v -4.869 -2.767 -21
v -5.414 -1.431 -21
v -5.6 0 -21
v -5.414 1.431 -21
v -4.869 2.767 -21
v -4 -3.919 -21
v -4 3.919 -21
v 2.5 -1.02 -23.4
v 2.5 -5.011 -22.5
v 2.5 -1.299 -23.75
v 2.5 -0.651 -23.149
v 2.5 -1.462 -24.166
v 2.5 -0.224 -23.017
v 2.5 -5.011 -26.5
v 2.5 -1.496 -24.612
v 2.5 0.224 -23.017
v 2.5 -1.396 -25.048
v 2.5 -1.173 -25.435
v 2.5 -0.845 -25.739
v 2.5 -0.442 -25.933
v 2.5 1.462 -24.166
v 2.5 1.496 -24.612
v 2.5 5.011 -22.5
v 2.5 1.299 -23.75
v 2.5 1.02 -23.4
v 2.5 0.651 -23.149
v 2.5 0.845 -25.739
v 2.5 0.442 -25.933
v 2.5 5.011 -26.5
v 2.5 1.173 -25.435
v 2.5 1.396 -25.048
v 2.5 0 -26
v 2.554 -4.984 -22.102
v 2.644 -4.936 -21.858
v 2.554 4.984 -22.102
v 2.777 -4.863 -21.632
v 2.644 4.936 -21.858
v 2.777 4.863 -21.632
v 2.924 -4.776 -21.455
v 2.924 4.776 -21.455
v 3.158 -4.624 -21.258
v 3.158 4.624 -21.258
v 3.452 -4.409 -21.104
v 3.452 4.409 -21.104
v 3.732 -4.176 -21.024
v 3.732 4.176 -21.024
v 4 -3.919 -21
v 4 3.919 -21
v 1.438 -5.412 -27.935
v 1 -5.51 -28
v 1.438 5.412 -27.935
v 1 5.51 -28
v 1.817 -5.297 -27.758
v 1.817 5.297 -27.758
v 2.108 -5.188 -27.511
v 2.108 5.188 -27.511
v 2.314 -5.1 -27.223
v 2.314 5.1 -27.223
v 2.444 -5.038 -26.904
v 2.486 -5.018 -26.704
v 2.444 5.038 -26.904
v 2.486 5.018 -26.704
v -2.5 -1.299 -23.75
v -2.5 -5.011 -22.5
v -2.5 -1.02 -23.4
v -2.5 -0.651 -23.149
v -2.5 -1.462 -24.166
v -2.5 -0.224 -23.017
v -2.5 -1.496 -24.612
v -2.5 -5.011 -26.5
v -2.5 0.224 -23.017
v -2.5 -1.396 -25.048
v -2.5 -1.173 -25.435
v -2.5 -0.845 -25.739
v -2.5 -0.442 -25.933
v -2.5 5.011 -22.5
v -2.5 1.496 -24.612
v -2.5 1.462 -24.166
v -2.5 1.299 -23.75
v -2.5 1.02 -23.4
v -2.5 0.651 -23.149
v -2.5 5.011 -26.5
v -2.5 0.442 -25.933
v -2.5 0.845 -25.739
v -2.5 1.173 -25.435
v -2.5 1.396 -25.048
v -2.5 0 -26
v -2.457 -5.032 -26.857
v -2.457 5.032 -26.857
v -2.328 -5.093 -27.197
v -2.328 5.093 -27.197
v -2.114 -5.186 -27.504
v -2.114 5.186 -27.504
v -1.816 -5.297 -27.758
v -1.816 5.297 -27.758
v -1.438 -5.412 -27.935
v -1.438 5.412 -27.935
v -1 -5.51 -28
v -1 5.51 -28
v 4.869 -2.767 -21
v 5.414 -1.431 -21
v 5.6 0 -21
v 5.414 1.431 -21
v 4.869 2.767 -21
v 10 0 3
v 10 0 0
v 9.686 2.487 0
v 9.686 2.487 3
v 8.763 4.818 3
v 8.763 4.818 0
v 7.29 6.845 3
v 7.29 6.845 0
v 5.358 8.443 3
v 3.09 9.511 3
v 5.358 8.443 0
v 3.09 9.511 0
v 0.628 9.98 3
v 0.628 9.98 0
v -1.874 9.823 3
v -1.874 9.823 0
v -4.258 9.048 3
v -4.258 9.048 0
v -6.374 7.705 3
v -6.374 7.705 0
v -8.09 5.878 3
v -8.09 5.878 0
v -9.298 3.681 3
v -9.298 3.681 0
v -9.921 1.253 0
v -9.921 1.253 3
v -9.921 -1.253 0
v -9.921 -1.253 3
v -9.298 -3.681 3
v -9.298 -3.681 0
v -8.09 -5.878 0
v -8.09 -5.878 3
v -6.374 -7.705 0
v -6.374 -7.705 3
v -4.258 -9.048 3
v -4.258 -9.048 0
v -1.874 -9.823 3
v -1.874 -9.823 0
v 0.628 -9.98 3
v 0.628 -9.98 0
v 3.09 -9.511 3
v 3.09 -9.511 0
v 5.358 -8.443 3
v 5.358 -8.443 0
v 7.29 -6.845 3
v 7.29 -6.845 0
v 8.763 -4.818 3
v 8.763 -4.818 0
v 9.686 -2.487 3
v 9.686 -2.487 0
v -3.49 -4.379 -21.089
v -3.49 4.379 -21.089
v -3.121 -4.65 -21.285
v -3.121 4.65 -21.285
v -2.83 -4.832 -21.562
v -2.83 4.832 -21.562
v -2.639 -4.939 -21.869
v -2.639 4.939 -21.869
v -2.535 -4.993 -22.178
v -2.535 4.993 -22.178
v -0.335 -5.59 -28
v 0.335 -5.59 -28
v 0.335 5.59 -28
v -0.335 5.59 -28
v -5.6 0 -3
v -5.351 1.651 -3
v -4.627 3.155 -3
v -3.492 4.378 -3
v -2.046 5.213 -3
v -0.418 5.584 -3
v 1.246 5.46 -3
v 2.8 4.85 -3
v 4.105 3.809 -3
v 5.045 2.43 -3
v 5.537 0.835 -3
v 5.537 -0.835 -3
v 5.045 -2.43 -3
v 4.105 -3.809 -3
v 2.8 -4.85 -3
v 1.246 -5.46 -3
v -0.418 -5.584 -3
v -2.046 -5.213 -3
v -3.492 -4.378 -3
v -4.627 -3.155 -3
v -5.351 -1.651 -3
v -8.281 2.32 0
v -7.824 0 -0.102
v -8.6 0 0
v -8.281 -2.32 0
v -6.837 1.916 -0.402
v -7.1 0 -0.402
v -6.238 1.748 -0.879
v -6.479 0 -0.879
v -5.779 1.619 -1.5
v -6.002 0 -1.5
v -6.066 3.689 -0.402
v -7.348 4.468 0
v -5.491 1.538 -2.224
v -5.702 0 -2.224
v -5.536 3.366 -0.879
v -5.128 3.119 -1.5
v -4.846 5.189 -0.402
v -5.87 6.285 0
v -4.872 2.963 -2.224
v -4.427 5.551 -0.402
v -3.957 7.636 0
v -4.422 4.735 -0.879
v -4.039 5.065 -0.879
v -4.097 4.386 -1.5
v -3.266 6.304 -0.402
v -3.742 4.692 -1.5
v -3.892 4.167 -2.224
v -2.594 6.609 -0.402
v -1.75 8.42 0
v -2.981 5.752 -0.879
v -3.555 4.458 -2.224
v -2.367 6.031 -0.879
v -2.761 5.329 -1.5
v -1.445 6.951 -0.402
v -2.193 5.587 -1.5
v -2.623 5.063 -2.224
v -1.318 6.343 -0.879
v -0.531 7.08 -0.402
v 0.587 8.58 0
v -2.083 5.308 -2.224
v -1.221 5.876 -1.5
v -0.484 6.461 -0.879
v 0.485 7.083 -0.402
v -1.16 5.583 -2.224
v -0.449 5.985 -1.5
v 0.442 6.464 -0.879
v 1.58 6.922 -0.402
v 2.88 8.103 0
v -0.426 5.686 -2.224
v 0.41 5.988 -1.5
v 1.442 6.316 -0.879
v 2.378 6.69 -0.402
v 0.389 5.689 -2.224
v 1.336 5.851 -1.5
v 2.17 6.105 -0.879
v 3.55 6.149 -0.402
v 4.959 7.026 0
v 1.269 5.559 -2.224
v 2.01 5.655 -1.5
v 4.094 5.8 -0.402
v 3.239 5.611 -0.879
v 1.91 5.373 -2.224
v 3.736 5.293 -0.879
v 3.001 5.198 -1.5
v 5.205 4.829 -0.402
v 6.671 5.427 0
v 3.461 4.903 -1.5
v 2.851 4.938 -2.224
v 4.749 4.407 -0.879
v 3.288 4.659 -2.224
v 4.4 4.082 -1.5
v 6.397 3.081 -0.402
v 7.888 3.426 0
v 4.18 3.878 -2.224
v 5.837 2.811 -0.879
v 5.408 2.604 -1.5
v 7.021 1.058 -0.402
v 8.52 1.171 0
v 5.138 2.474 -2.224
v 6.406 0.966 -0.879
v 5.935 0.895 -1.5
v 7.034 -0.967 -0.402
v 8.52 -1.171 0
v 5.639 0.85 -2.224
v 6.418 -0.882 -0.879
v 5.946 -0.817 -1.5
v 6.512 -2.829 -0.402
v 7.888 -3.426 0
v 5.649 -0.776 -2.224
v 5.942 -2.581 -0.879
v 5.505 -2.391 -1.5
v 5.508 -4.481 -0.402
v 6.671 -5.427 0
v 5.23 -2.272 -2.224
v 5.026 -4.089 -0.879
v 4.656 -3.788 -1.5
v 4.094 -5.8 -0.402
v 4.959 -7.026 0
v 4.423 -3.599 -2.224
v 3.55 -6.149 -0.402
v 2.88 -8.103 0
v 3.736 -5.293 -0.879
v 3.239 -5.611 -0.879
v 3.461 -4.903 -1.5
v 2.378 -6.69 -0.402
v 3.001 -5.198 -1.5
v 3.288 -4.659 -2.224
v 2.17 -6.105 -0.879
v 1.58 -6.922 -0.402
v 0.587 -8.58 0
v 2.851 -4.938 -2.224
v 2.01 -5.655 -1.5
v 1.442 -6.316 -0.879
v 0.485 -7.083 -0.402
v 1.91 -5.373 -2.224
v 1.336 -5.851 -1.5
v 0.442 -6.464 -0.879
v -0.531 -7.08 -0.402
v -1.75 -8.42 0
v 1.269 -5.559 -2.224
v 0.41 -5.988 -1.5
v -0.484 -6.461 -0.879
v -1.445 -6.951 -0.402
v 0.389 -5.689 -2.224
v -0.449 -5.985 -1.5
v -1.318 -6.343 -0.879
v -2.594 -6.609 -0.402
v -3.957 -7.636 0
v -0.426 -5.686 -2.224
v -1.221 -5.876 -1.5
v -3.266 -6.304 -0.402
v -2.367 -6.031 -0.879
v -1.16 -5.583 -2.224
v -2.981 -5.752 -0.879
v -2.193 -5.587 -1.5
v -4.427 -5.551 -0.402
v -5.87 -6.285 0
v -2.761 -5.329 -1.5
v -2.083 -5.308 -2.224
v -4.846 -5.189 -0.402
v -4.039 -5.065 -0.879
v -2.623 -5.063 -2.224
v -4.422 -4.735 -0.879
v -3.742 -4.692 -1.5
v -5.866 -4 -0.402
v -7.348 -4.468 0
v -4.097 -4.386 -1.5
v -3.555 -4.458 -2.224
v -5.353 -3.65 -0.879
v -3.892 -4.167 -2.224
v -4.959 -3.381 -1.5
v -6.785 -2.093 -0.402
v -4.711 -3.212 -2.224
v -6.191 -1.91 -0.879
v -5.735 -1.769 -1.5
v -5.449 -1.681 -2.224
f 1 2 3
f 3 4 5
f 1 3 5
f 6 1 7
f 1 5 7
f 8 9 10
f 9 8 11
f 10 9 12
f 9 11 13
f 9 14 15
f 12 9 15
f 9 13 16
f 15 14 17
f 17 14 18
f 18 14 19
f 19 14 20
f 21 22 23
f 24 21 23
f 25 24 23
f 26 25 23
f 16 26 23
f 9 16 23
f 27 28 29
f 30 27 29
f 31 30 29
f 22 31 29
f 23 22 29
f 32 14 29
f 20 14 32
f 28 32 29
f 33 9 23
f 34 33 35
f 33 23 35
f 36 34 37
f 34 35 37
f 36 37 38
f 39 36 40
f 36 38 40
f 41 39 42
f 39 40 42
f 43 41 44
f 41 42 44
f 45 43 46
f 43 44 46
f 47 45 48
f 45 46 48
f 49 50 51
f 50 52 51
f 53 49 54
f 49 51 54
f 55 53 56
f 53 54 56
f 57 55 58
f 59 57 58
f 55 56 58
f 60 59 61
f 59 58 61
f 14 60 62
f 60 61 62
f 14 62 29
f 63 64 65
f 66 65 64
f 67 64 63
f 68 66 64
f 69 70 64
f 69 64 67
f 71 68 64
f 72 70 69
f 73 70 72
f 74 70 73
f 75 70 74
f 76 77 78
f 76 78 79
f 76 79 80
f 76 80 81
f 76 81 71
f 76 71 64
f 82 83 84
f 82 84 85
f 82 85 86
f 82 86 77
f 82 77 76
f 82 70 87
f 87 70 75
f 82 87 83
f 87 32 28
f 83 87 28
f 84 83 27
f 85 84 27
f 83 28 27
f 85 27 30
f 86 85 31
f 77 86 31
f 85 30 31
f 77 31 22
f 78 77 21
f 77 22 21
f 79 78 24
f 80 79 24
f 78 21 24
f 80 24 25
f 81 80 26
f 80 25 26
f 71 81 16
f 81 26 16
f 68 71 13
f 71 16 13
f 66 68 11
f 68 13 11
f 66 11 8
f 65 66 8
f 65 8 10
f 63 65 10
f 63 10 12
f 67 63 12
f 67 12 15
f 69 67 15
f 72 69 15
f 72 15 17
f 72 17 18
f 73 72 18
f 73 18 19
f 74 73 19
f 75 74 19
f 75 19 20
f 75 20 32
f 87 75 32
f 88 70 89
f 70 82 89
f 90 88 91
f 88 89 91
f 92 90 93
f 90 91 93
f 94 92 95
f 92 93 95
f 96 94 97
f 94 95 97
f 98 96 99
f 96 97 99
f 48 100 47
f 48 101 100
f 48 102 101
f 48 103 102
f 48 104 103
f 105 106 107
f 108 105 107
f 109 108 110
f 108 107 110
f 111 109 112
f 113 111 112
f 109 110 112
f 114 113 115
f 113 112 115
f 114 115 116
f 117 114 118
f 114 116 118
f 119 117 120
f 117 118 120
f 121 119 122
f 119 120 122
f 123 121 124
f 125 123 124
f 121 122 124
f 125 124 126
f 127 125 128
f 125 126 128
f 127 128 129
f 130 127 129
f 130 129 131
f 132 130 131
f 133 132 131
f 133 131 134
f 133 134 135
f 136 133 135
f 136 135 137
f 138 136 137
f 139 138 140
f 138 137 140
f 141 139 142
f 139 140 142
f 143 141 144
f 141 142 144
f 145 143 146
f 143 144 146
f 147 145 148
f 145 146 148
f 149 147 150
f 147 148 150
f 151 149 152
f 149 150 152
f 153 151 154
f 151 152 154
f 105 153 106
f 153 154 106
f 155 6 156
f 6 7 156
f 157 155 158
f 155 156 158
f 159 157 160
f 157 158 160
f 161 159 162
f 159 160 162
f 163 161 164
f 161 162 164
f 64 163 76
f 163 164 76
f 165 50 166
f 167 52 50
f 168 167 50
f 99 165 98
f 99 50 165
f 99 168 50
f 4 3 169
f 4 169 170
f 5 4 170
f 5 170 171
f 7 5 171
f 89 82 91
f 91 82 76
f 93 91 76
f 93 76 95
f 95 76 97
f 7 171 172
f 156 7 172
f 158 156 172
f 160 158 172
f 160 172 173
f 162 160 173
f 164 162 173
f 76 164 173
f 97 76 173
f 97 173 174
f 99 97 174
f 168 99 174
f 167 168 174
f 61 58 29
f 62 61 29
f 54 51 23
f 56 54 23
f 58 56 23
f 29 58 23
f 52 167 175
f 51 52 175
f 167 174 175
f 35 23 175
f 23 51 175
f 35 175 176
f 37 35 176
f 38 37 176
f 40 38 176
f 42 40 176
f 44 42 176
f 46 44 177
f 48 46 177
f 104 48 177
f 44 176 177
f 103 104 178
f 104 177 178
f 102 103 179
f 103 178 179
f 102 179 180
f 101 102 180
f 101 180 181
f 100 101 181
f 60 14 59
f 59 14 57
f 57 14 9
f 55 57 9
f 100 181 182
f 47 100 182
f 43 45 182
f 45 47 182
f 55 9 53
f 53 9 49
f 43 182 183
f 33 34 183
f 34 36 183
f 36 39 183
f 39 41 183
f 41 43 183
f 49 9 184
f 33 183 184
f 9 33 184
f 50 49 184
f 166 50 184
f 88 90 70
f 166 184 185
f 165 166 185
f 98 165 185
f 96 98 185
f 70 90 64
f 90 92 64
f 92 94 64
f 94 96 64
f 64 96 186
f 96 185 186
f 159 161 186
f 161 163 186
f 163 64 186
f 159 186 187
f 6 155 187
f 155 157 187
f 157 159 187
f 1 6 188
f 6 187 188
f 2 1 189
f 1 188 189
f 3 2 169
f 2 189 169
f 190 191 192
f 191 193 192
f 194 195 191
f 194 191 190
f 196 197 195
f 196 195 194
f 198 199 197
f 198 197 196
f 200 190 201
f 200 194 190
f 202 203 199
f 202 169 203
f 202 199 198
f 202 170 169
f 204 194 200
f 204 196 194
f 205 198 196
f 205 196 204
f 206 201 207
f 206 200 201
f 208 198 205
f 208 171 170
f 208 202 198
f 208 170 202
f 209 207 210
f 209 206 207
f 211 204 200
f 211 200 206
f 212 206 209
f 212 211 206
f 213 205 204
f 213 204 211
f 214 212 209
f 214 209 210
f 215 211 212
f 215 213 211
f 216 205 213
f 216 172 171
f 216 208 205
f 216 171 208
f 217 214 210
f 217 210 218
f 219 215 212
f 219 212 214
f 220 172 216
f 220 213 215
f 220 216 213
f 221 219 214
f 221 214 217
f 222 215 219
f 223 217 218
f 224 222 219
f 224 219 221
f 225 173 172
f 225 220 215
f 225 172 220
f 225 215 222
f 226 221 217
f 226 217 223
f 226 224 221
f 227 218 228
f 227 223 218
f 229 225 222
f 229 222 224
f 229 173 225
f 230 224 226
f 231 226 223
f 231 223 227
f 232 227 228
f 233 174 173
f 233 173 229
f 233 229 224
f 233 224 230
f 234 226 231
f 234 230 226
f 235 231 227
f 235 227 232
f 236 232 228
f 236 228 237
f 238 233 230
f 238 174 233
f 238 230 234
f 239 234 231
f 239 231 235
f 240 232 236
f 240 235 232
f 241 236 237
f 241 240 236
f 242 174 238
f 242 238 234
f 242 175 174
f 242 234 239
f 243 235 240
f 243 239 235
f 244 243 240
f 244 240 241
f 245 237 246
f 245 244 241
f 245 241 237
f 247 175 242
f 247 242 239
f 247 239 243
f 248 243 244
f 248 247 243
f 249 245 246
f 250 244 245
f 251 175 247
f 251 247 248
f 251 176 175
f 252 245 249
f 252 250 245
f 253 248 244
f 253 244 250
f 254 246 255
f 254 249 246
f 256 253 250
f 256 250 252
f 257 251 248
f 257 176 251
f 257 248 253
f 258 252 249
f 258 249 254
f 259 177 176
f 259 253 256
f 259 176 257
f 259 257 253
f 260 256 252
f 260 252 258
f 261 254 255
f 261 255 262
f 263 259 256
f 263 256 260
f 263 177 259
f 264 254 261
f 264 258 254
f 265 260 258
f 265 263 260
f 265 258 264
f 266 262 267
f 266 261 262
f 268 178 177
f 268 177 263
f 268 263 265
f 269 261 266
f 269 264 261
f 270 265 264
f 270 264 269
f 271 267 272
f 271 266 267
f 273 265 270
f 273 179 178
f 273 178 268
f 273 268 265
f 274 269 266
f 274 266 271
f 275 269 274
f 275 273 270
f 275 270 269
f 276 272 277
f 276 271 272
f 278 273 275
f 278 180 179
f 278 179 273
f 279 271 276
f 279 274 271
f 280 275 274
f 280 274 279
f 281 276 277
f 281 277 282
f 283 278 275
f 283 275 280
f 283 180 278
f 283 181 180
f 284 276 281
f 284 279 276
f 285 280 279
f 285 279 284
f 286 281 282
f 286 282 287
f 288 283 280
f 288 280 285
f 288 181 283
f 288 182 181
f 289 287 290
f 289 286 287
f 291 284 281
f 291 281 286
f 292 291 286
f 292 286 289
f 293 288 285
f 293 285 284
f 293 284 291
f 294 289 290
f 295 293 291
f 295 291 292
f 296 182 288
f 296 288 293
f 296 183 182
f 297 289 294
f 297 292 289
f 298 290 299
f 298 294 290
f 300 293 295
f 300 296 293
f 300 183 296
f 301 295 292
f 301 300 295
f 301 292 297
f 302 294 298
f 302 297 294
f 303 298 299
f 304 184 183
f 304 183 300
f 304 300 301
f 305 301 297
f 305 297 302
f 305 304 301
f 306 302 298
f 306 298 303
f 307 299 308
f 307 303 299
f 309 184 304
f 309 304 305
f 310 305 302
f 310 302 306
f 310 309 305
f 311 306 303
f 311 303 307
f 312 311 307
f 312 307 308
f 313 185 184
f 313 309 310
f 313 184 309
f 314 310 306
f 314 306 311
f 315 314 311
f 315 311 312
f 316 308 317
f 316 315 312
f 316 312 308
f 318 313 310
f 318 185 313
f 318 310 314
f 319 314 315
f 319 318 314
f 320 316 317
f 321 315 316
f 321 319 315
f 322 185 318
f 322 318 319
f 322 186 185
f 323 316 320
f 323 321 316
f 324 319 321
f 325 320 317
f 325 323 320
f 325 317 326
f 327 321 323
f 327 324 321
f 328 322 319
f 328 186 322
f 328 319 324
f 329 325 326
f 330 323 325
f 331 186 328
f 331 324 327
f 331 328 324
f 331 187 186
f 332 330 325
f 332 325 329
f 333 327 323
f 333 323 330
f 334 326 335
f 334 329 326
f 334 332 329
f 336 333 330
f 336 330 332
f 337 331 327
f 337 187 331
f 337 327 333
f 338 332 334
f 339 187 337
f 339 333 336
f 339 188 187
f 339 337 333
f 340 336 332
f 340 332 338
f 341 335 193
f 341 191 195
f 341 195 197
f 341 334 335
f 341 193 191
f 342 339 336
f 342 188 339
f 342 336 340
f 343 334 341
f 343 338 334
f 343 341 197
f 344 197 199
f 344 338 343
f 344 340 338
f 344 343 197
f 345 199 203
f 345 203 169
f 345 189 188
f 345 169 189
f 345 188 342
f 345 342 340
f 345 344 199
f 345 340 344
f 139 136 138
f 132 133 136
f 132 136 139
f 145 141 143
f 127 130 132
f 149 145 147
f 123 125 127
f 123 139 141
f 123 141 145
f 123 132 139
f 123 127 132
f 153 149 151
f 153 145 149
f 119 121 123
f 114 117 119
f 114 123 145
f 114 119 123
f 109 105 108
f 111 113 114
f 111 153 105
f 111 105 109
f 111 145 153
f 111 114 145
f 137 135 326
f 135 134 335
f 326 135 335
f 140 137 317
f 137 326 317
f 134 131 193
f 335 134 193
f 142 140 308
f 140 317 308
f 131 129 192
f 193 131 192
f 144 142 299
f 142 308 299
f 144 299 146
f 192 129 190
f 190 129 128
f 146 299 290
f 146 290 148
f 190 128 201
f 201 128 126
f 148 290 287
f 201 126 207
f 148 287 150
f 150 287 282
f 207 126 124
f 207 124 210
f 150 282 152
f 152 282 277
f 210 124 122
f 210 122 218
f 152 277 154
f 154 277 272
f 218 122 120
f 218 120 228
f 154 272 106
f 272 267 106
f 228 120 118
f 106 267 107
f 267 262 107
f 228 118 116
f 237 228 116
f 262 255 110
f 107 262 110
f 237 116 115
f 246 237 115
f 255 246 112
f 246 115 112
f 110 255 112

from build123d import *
from OCP.BRepFilletAPI import BRepFilletAPI_MakeFillet

# Parameters (mm, degrees)
SKETCH1_R           = 10
BOSS_EXTRUDE1_DEPTH = 3
SKETCH2_R           = 5.6
BOSS_EXTRUDE2_DEPTH = 28
CUT_EXTRUDE1_DEPTH  = 7
CUT_EXTRUDE2_REACH  = 34.253
SKETCH4_R           = 1.5
FILLET1_R1          = 3
FILLET1_R2          = 1.5


with BuildPart() as part:
    # Sketch1 → Boss-Extrude1 (new body)
    with BuildSketch(Plane.XY):
        Circle(SKETCH1_R)
    extrude(amount=BOSS_EXTRUDE1_DEPTH)

    # Sketch2 → Boss-Extrude2 (add)
    with BuildSketch(Plane(origin=(0, 0, 0), x_dir=(-1, 0, 0), z_dir=(0, 0, -1))):
        Circle(SKETCH2_R)
    extrude(amount=BOSS_EXTRUDE2_DEPTH)

    # Sketch3 → Cut-Extrude1 (cut)
    with BuildSketch(Plane(origin=(0, 0, -28), x_dir=(-1, 0, 0), z_dir=(0, 0, -1))):
        with BuildLine():
            Line((2.5, 0), (2.5, 6.663171691))
            ThreePointArc((2.5, 6.663171691), (8.066213365, -0.537352556), (2.5, -7.737876802))
            Line((2.5, -7.737876802), (2.5, 0))
        make_face()
        with BuildLine():
            Line((-2.5, 0), (-2.5, 6.663171691))
            ThreePointArc((-2.5, 6.663171691), (-7.668145551, -0.537352556), (-2.5, -7.737876802))
            Line((-2.5, -7.737876802), (-2.5, 0))
        make_face()
    extrude(amount=-CUT_EXTRUDE1_DEPTH, mode=Mode.SUBTRACT)

    # Sketch4 → Cut-Extrude2 (cut, up to next)
    with BuildSketch(Plane(origin=(2.5, 0, 0), x_dir=(0, 0, -1), z_dir=(1, 0, 0)), mode=Mode.PRIVATE) as cut_extrude2_sk1:
        with Locations((24.5, 0)):
            Circle(SKETCH4_R)
    cut_extrude2_tool1 = extrude(cut_extrude2_sk1.sketch, amount=-CUT_EXTRUDE2_REACH, mode=Mode.PRIVATE) & part.part
    add(cut_extrude2_tool1.solids().sort_by_distance((2.5, 0, -24.5))[0], mode=Mode.SUBTRACT)

    # Fillet1: one fillet with a radius per group of edges: ONE call of the kernel's fillet builder (fillet() takes one radius for all edges)
    fillet1_edges_1 = [part.edges().sort_by_distance(p)[0] for p in [
        (5.6, 0, 0),
    ]]
    fillet1_edges_2 = [part.edges().sort_by_distance(p)[0] for p in [
        (2.5, 0, -21),
        (-2.5, 0, -21),
        (2.5, 0, -28),
        (-2.5, 0, -28),
    ]]
    fillet1 = BRepFilletAPI_MakeFillet(part.part.solid().wrapped)
    for e in fillet1_edges_1:
        fillet1.Add(FILLET1_R1, e.wrapped)
    for e in fillet1_edges_2:
        fillet1.Add(FILLET1_R2, e.wrapped)
    add(Compound.cast(fillet1.Shape()), mode=Mode.REPLACE)


solid = part.part
